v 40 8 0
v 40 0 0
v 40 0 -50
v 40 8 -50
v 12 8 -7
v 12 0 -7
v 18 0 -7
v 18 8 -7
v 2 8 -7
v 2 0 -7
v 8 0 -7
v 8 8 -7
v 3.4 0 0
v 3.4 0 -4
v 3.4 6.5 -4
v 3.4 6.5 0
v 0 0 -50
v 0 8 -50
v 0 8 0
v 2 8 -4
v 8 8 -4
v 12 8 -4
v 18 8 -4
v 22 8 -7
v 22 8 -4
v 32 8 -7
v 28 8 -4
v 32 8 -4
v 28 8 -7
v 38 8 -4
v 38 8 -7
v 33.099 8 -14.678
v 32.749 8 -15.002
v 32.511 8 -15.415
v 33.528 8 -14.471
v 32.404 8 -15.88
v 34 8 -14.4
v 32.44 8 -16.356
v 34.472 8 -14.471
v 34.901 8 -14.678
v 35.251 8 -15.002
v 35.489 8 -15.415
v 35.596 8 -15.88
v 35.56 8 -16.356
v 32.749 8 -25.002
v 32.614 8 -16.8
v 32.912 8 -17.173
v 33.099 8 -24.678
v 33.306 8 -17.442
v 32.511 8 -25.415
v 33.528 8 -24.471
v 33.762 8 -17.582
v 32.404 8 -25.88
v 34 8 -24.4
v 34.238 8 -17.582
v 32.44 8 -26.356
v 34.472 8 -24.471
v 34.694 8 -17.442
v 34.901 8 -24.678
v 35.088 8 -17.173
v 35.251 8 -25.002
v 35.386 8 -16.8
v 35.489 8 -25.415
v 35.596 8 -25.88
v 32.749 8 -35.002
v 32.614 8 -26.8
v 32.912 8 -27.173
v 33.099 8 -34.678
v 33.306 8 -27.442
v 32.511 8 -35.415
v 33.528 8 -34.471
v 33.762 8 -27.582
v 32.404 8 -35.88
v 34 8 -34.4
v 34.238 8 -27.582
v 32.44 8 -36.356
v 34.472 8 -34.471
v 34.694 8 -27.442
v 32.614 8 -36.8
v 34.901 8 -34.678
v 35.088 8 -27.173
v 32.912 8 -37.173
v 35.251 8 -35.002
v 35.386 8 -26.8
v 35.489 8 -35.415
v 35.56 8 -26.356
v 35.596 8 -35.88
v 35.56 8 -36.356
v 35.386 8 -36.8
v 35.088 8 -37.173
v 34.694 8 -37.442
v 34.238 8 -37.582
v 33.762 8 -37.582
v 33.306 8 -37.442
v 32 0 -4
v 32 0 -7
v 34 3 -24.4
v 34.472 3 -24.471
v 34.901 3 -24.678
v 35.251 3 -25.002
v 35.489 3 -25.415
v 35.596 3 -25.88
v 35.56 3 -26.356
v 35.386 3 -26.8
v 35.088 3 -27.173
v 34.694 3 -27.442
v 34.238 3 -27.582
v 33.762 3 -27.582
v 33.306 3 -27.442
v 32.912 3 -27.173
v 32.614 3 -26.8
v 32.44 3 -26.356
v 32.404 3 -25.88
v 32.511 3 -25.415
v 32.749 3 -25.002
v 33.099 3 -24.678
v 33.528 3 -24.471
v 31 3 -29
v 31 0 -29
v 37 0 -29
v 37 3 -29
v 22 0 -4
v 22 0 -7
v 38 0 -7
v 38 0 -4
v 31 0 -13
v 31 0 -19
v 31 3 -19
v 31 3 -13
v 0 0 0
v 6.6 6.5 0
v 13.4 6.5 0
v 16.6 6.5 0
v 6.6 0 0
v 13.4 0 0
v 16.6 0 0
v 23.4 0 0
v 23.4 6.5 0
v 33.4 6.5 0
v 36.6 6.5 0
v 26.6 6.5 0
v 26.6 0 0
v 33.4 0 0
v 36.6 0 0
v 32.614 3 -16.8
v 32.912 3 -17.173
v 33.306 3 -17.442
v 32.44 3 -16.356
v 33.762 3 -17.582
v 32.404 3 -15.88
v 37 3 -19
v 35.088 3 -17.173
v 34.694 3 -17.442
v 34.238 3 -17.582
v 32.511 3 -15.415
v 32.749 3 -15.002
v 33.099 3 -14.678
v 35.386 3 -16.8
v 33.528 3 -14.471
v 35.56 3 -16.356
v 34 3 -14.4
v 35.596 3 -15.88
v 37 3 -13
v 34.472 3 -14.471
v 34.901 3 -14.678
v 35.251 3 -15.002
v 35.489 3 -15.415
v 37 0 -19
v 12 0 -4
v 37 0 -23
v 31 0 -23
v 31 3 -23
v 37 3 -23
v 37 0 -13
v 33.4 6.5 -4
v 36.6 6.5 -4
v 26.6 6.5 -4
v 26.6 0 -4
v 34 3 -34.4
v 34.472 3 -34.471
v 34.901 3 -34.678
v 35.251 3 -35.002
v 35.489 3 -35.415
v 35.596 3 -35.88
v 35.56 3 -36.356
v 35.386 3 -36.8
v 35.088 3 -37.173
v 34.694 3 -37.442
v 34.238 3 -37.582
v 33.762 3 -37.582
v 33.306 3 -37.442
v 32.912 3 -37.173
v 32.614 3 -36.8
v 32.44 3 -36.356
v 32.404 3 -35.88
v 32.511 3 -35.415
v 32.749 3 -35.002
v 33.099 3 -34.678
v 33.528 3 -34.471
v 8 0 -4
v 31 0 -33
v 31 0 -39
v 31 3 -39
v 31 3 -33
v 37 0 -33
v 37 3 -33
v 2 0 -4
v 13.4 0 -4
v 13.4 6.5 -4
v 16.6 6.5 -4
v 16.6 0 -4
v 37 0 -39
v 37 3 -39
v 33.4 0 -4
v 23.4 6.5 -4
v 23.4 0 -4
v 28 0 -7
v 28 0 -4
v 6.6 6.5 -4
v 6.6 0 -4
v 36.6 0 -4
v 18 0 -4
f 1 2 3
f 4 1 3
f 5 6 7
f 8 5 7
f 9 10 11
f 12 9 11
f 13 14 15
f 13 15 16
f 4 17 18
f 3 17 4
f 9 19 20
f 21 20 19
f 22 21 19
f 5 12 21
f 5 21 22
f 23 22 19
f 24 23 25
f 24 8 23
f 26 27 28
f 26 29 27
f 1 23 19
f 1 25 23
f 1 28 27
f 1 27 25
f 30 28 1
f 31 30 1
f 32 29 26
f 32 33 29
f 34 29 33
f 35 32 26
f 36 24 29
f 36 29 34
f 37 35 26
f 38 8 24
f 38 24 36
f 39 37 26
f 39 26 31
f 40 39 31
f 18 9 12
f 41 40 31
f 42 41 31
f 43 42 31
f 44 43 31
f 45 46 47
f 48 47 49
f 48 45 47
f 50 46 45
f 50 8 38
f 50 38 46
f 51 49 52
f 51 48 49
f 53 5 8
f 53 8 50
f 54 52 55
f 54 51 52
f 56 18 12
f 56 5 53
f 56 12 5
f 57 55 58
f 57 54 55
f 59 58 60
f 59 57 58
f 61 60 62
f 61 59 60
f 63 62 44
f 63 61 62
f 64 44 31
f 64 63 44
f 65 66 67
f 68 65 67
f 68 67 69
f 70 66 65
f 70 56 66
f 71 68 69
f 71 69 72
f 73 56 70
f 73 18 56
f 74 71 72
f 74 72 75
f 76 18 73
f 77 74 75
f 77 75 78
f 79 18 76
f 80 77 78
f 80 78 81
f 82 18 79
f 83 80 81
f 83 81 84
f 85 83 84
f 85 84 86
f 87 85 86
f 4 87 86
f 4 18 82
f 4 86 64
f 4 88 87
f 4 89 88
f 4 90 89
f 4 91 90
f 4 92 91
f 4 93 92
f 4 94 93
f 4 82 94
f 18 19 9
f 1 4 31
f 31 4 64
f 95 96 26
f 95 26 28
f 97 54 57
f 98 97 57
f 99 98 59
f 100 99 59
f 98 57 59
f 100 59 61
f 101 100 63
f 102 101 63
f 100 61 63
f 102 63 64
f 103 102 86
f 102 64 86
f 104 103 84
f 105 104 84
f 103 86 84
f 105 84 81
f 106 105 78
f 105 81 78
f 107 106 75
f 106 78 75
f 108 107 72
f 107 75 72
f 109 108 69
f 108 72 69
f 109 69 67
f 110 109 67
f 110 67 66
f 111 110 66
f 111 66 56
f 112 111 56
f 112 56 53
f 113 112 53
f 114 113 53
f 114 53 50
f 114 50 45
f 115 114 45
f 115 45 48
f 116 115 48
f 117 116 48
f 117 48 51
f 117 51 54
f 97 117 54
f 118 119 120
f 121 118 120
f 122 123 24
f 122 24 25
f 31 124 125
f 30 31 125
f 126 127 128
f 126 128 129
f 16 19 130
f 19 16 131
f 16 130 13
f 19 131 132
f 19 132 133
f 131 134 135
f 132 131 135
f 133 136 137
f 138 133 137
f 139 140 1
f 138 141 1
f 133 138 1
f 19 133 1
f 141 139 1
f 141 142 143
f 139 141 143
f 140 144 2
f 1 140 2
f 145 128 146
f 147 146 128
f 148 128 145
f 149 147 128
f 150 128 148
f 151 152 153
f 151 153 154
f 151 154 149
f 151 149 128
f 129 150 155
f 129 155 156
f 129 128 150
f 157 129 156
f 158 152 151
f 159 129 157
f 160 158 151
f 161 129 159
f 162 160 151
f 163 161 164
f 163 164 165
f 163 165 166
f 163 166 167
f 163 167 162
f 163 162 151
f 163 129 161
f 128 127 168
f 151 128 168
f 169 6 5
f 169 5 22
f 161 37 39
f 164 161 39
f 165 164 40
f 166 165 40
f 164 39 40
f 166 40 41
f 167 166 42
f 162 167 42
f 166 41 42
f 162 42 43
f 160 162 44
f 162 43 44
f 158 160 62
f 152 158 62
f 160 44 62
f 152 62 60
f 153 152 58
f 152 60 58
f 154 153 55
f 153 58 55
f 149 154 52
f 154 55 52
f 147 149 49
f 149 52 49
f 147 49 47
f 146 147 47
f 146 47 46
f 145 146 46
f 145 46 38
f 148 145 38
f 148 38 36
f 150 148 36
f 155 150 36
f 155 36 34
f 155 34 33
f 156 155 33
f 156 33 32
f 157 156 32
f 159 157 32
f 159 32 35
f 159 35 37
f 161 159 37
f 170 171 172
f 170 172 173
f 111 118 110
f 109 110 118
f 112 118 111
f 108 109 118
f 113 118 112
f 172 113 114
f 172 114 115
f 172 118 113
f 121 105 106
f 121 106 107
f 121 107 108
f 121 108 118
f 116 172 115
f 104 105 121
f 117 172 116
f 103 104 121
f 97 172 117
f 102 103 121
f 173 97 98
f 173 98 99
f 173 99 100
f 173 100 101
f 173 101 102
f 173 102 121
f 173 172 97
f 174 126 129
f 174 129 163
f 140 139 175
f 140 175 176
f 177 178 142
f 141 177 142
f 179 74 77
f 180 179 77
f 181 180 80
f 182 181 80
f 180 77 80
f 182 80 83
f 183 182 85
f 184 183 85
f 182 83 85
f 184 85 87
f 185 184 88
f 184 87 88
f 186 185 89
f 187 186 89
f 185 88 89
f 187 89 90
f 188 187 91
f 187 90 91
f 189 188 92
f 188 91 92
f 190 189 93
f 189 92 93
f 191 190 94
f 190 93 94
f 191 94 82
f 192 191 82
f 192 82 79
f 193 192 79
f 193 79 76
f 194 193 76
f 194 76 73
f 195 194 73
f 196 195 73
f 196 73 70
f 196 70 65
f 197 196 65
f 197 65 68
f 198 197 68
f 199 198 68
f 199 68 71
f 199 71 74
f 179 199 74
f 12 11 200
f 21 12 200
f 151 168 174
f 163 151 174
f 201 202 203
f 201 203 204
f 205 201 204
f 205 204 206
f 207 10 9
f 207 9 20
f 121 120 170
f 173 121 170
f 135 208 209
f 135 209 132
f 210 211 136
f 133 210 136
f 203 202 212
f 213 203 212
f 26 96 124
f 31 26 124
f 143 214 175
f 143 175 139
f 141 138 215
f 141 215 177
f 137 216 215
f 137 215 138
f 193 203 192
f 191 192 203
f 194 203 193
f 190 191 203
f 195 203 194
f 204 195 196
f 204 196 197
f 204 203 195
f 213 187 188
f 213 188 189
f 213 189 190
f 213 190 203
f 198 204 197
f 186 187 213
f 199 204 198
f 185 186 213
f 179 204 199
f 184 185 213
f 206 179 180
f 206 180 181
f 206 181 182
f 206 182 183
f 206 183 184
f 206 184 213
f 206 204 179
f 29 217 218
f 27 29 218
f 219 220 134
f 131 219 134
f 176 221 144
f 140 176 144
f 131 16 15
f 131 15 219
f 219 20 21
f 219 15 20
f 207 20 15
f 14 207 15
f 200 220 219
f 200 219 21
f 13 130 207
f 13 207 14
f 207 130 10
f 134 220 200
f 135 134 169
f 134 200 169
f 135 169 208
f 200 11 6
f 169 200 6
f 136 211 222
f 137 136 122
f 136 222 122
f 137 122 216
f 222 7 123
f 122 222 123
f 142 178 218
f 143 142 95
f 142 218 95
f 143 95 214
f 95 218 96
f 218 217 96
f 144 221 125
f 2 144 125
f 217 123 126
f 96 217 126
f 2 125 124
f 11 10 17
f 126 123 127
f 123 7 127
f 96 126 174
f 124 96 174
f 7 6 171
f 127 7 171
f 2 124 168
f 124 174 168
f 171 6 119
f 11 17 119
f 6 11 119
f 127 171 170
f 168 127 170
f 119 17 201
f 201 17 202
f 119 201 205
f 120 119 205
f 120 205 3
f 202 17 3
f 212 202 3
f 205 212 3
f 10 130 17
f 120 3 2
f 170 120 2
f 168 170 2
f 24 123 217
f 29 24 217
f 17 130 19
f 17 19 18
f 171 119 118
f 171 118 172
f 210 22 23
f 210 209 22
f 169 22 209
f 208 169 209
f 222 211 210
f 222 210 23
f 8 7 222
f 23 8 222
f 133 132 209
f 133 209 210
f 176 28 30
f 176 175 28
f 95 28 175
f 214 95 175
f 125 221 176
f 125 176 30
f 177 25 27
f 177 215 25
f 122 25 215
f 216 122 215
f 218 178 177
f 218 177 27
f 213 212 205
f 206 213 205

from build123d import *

# Parameters (mm, degrees)
SKETCH_1_W          = 40
SKETCH_1_H          = 50
EXTRUDE_1_DEPTH     = 8
SKETCH_2_W          = 3.2
SKETCH_2_H          = 4
CUT_EXTRUDE_1_DEPTH = 6.5
SKETCH_3_W          = 6
SKETCH_3_H          = 3
CUT_EXTRUDE_2_DEPTH = 16.5
SKETCH_10_R         = 1.6
CUT_EXTRUDE_7_DEPTH = 13
SKETCH_11_W         = 6
SKETCH_11_H         = 6
CUT_EXTRUDE_8_DEPTH = 3


with BuildPart() as part:
    # 草图1 → 凸台-拉伸1 (new body)
    with BuildSketch(Plane(origin=(0, 0, 0), x_dir=(1, 0, 0), z_dir=(0, 1, 0))):
        with Locations((20, 25)):
            Rectangle(SKETCH_1_W, SKETCH_1_H)
    extrude(amount=EXTRUDE_1_DEPTH)

    # 草图2 → 切除-拉伸1 (cut)
    with BuildSketch(Plane.XZ):
        with Locations((5, -2)):
            Rectangle(SKETCH_2_W, SKETCH_2_H)
        with Locations((15, -2)):
            Rectangle(SKETCH_2_W, SKETCH_2_H)
        with Locations((25, -2)):
            Rectangle(SKETCH_2_W, SKETCH_2_H)
        with Locations((35, -2)):
            Rectangle(SKETCH_2_W, SKETCH_2_H)
    extrude(amount=-CUT_EXTRUDE_1_DEPTH, mode=Mode.SUBTRACT)

    # 草图3 → 切除-拉伸2 (cut)
    with BuildSketch(Plane.XZ):
        with Locations((5, -5.5)):
            Rectangle(SKETCH_3_W, SKETCH_3_H)
        with Locations((15, -5.5)):
            Rectangle(SKETCH_3_W, SKETCH_3_H)
        with Locations((25, -5.5)):
            Rectangle(SKETCH_3_W, SKETCH_3_H)
        with Locations((35, -5.5)):
            Rectangle(SKETCH_3_W, SKETCH_3_H)
    extrude(amount=-CUT_EXTRUDE_2_DEPTH, mode=Mode.SUBTRACT)

    # 草图10 → 切除-拉伸7 (cut)
    with BuildSketch(Plane(origin=(0, 8, 0), x_dir=(1, 0, 0), z_dir=(0, 1, 0))):
        with Locations(Location((34, 16, 0), (0, 0, 270))):
            Circle(SKETCH_10_R)
        with Locations(Location((34, 26, 0), (0, 0, 270))):
            Circle(SKETCH_10_R)
        with Locations(Location((34, 36, 0), (0, 0, 270))):
            Circle(SKETCH_10_R)
    extrude(amount=-CUT_EXTRUDE_7_DEPTH, mode=Mode.SUBTRACT)

    # 草图11 → 切除-拉伸8 (cut)
    with BuildSketch(Plane.XZ):
        with Locations((34, -26)):
            Rectangle(SKETCH_11_W, SKETCH_11_H)
        with Locations((34, -36)):
            Rectangle(SKETCH_11_W, SKETCH_11_H)
        with Locations((34, -16)):
            Rectangle(SKETCH_11_W, SKETCH_11_H)
    extrude(amount=-CUT_EXTRUDE_8_DEPTH, mode=Mode.SUBTRACT)


solid = part.part
